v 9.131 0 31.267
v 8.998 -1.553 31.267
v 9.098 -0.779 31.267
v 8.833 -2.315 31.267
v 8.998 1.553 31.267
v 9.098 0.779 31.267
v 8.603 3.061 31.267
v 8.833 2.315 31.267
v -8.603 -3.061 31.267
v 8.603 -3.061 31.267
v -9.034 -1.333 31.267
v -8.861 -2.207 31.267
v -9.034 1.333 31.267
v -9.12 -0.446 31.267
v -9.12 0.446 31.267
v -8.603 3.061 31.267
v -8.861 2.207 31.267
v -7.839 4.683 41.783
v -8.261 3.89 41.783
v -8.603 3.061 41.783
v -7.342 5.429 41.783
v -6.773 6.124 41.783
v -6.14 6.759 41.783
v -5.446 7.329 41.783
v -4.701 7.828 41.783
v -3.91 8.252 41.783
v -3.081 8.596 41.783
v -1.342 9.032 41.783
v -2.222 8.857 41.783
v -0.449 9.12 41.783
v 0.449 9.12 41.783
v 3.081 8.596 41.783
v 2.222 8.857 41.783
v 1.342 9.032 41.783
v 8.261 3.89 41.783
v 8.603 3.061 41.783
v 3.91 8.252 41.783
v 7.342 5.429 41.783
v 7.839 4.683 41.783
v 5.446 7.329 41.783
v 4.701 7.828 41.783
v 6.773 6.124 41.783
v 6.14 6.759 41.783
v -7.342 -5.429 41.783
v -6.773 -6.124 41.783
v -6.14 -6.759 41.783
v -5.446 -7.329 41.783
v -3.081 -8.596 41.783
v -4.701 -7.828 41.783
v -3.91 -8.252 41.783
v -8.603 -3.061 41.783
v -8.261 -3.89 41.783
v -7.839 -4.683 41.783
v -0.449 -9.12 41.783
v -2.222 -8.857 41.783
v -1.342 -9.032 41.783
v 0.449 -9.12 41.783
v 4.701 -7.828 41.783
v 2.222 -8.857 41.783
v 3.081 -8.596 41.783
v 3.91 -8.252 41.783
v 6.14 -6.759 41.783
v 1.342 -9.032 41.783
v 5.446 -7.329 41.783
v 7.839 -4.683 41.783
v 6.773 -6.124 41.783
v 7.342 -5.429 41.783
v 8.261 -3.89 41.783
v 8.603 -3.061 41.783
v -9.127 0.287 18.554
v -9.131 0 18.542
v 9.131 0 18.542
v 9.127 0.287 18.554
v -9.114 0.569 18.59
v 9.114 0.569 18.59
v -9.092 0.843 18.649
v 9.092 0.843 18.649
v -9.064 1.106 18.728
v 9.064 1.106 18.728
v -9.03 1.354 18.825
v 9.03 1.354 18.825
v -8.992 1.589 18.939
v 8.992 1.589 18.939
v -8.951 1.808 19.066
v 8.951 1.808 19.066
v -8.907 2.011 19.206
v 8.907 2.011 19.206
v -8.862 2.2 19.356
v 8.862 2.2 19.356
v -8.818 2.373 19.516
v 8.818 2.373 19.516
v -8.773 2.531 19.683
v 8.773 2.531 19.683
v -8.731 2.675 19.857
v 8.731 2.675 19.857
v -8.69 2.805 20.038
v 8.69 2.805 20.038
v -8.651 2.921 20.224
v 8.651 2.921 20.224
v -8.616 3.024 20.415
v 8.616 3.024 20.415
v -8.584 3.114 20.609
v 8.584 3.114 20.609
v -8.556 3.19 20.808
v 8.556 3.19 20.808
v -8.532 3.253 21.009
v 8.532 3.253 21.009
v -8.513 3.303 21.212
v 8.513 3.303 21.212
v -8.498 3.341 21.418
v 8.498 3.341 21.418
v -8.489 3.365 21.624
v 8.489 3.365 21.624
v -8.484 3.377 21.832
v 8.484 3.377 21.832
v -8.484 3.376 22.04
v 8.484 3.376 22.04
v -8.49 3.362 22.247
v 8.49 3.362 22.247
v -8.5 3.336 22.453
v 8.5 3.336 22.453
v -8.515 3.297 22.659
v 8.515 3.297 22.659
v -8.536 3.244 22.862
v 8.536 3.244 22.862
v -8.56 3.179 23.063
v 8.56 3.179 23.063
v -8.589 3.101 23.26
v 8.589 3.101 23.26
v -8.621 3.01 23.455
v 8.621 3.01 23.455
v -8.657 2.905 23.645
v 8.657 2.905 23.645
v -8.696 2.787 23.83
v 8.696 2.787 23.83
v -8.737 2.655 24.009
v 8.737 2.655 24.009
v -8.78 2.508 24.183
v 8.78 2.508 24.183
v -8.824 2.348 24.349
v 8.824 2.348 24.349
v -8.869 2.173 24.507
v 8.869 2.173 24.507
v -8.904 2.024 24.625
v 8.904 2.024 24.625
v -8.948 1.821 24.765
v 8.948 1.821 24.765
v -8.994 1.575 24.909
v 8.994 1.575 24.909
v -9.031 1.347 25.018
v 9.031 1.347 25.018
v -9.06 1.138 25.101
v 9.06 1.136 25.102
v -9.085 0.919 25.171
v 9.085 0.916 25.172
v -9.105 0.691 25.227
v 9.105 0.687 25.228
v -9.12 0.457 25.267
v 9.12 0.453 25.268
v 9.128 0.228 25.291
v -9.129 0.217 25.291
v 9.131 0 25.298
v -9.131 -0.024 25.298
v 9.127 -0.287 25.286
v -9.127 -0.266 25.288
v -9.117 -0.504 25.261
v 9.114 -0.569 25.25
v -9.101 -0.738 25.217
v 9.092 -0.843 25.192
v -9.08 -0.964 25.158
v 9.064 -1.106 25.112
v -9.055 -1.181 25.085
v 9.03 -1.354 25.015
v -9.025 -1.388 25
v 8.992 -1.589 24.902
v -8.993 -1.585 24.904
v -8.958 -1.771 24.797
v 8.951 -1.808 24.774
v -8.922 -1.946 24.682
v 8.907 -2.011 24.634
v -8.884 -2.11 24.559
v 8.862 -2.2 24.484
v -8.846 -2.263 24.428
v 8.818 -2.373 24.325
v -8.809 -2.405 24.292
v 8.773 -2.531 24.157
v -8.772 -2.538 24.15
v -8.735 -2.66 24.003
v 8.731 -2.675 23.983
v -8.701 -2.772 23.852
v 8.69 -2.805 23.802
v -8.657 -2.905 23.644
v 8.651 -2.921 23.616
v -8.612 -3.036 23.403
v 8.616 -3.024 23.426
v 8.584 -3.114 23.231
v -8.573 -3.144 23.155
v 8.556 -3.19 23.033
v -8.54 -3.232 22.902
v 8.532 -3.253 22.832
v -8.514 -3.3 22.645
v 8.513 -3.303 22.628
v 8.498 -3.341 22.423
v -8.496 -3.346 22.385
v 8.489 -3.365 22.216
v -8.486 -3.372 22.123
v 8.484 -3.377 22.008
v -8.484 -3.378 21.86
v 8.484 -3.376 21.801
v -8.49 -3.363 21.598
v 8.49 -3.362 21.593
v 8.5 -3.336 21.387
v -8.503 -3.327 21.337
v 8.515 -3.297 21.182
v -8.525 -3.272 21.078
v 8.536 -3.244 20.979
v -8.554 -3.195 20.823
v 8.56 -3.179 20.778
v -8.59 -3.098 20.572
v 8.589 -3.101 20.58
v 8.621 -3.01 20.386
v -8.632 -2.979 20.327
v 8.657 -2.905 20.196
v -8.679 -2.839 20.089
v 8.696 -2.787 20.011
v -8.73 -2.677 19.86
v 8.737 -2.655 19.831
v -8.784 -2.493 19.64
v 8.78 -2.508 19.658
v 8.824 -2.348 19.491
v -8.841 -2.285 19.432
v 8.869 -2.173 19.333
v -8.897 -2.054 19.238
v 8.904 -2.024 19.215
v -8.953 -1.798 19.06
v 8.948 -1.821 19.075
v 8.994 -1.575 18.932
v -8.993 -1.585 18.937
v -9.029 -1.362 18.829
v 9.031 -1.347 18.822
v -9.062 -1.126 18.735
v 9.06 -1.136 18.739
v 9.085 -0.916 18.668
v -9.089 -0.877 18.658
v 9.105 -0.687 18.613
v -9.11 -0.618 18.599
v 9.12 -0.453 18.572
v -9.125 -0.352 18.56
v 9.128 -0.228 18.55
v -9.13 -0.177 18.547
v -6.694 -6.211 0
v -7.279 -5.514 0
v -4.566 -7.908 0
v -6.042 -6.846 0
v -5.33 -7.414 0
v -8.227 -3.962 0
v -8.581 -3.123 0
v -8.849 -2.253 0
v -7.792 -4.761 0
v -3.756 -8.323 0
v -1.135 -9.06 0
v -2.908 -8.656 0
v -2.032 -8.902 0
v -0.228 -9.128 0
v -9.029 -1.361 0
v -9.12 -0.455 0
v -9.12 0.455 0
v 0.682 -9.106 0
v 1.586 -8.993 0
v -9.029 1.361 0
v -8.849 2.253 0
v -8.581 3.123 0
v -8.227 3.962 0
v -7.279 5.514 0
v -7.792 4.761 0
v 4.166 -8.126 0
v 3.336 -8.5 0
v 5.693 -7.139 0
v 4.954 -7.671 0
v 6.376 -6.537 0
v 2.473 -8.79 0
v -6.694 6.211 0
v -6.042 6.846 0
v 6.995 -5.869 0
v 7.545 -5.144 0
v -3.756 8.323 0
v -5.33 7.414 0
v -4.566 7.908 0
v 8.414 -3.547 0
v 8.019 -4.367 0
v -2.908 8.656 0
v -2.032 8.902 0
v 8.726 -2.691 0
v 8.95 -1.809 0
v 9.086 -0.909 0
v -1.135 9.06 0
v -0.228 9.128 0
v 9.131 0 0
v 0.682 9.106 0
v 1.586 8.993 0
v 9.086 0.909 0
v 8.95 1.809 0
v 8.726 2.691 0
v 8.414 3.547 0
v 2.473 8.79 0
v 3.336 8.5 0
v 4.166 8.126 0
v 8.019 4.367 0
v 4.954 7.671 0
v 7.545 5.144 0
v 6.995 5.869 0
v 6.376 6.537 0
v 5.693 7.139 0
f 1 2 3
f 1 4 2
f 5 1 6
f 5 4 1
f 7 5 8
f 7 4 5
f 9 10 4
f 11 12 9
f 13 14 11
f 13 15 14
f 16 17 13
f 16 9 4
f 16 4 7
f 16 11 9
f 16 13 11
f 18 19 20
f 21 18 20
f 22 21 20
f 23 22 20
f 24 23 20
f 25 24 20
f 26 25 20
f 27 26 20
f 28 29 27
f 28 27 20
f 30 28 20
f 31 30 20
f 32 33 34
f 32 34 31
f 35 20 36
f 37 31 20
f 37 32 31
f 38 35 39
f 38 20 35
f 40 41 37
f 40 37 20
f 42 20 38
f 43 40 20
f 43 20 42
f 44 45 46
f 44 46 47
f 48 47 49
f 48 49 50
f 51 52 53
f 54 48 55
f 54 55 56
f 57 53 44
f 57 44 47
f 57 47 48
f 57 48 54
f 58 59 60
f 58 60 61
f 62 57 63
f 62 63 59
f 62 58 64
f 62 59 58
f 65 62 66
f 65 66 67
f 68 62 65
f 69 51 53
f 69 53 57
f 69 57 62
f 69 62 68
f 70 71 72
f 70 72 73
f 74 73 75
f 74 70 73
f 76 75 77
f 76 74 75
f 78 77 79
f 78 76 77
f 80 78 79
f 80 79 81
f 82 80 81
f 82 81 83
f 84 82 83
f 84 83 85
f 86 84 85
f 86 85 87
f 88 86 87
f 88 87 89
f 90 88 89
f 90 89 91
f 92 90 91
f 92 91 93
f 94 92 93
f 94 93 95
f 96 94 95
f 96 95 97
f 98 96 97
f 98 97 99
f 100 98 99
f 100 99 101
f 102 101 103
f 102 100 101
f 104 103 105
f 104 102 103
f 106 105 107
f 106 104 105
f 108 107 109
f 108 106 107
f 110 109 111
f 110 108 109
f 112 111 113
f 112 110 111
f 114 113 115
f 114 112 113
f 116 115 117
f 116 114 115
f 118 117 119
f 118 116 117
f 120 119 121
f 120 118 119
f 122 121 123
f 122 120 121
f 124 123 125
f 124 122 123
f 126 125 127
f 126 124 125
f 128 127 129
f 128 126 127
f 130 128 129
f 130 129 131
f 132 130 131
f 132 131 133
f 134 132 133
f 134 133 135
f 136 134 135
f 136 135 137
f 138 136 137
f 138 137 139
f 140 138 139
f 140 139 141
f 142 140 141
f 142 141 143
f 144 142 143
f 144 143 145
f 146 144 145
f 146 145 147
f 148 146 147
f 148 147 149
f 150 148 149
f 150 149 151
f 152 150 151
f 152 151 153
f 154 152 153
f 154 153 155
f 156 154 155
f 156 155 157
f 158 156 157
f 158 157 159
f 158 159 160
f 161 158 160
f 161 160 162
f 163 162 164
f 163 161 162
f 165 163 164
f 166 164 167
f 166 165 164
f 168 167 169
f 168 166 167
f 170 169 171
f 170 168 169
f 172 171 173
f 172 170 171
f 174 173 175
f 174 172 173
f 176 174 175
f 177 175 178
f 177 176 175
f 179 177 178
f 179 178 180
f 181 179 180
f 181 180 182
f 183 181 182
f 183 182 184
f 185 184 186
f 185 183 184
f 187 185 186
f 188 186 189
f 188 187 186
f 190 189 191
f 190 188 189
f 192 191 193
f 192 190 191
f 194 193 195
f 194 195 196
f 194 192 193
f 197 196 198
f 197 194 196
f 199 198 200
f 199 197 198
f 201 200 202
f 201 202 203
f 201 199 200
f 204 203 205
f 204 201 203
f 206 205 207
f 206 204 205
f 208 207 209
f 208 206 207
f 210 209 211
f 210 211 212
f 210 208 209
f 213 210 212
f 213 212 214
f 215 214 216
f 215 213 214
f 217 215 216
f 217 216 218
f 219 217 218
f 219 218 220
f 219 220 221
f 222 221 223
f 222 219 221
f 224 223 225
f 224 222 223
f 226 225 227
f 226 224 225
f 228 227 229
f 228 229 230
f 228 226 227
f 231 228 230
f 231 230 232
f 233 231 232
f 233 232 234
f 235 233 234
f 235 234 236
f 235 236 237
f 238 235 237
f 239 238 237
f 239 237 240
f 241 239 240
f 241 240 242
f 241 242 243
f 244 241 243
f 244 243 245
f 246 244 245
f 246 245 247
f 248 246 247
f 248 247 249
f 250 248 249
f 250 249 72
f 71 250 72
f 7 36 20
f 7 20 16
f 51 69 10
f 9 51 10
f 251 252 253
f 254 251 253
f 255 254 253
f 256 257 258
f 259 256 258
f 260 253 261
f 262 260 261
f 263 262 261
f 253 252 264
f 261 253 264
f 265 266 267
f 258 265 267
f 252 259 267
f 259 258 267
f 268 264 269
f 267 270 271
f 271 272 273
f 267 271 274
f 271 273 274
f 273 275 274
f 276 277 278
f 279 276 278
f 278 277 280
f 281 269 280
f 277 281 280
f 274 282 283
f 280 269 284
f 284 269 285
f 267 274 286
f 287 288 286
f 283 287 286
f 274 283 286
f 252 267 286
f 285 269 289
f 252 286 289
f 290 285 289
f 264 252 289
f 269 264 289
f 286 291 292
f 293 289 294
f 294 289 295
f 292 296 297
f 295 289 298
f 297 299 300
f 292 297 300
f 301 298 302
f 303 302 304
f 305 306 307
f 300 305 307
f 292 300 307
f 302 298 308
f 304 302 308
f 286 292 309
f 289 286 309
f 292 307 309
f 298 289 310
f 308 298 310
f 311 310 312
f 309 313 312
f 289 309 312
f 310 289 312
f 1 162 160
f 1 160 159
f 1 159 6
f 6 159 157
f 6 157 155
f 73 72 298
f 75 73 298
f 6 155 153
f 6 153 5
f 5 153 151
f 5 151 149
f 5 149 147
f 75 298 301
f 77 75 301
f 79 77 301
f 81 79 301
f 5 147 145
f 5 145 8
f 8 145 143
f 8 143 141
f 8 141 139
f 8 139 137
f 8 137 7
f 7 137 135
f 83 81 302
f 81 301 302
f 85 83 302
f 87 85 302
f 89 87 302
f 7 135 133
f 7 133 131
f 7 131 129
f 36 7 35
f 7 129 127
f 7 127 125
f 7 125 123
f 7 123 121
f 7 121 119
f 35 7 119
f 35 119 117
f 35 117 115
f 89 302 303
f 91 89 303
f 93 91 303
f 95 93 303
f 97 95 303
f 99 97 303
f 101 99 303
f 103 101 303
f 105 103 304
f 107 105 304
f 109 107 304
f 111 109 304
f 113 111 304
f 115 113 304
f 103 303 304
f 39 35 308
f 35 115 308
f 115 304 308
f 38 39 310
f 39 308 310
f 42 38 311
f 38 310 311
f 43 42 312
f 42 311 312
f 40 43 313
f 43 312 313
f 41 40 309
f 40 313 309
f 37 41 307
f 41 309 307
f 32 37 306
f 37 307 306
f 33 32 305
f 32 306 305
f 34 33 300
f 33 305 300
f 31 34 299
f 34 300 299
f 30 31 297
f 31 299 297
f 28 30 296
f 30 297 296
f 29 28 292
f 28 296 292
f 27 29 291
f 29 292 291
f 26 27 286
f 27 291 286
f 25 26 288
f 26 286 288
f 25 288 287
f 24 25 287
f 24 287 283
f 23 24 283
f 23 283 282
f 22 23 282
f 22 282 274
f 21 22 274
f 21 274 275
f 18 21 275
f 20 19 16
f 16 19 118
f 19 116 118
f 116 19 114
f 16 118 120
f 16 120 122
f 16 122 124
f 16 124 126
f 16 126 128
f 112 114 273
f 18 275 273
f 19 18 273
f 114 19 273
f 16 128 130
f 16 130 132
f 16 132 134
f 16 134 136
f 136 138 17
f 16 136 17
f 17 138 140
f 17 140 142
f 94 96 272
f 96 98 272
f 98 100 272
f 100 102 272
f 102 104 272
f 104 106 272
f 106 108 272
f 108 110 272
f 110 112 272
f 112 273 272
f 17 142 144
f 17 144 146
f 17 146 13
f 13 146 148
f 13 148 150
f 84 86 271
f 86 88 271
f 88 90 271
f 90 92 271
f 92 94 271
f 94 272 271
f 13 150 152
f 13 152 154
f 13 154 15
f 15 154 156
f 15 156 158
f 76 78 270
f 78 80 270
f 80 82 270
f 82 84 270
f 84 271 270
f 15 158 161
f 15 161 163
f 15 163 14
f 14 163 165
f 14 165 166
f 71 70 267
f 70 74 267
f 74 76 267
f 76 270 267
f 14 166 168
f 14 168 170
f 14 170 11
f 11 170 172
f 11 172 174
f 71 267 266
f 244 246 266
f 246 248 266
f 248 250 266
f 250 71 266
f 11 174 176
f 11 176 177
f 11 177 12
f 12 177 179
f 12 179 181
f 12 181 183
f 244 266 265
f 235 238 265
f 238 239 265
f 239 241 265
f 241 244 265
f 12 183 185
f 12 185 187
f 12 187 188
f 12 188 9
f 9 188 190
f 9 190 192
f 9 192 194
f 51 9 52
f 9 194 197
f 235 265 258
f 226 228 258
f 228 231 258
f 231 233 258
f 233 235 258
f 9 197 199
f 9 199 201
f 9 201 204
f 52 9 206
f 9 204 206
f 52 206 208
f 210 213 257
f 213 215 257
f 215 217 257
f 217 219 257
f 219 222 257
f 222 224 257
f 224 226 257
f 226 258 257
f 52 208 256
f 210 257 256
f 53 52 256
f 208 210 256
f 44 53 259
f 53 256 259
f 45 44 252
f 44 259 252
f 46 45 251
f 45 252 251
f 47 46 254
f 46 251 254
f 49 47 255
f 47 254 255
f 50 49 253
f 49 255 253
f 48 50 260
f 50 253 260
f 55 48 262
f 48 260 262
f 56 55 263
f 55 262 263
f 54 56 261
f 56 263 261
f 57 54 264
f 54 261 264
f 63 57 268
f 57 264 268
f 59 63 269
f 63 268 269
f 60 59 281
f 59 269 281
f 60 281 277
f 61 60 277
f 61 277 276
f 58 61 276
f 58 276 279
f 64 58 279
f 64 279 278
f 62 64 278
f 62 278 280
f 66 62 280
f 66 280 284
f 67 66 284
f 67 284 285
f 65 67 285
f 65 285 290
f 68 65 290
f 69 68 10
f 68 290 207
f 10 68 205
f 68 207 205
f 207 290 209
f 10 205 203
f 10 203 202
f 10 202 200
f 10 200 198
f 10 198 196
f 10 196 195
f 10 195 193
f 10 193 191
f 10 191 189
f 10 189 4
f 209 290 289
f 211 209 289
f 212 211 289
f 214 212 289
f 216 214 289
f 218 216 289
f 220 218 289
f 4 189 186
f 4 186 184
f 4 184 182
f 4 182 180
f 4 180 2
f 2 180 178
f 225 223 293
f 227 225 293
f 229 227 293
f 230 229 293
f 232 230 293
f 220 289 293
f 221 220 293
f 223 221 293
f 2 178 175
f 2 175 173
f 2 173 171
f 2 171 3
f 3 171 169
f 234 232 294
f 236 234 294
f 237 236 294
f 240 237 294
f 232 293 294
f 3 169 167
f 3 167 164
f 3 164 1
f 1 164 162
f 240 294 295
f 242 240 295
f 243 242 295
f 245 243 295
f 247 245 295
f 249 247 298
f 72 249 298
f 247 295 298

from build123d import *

# Parameters (mm, degrees)
SKETCH1_R               = 9.1313
BOSS_EXTRUDE1_DEPTH     = 41.783
CUT_EXTRUDE1_DEPTH      = 44.733058073
CUT_EXTRUDE1_DEPTH_BACK = 44.733058073
SKETCH2_R               = 3.3782
CUT_EXTRUDE3_DEPTH      = 44.73305821
CUT_EXTRUDE3_DEPTH_BACK = 44.73305821
SKETCH3_W               = 10.5156
SKETCH3_H               = 6.1214


with BuildPart() as part:
    # Sketch1 → Boss-Extrude1 (new body)
    with BuildSketch(Plane.XY):
        Circle(SKETCH1_R)
    extrude(amount=BOSS_EXTRUDE1_DEPTH)

    # Sketch2 → Cut-Extrude1 (cut, two sides: drawn at the far end of the back side and taken through both)
    with BuildSketch(Plane(origin=(0, 0, 0), x_dir=(0, 0, -1), z_dir=(1, 0, 0)).offset(-CUT_EXTRUDE1_DEPTH_BACK)):
        with Locations((-21.9202, 0)):
            Circle(SKETCH2_R)
    extrude(amount=CUT_EXTRUDE1_DEPTH + CUT_EXTRUDE1_DEPTH_BACK, mode=Mode.SUBTRACT)

    # Sketch3 → Cut-Extrude3 (cut, two sides: drawn at the far end of the back side and taken through both)
    with BuildSketch(Plane(origin=(0, 0, 0), x_dir=(0, 0, -1), z_dir=(1, 0, 0)).offset(-CUT_EXTRUDE3_DEPTH_BACK)):
        with Locations((-36.5252, 0)):
            Rectangle(SKETCH3_W, SKETCH3_H)
    extrude(amount=CUT_EXTRUDE3_DEPTH + CUT_EXTRUDE3_DEPTH_BACK, mode=Mode.SUBTRACT)


solid = part.part
